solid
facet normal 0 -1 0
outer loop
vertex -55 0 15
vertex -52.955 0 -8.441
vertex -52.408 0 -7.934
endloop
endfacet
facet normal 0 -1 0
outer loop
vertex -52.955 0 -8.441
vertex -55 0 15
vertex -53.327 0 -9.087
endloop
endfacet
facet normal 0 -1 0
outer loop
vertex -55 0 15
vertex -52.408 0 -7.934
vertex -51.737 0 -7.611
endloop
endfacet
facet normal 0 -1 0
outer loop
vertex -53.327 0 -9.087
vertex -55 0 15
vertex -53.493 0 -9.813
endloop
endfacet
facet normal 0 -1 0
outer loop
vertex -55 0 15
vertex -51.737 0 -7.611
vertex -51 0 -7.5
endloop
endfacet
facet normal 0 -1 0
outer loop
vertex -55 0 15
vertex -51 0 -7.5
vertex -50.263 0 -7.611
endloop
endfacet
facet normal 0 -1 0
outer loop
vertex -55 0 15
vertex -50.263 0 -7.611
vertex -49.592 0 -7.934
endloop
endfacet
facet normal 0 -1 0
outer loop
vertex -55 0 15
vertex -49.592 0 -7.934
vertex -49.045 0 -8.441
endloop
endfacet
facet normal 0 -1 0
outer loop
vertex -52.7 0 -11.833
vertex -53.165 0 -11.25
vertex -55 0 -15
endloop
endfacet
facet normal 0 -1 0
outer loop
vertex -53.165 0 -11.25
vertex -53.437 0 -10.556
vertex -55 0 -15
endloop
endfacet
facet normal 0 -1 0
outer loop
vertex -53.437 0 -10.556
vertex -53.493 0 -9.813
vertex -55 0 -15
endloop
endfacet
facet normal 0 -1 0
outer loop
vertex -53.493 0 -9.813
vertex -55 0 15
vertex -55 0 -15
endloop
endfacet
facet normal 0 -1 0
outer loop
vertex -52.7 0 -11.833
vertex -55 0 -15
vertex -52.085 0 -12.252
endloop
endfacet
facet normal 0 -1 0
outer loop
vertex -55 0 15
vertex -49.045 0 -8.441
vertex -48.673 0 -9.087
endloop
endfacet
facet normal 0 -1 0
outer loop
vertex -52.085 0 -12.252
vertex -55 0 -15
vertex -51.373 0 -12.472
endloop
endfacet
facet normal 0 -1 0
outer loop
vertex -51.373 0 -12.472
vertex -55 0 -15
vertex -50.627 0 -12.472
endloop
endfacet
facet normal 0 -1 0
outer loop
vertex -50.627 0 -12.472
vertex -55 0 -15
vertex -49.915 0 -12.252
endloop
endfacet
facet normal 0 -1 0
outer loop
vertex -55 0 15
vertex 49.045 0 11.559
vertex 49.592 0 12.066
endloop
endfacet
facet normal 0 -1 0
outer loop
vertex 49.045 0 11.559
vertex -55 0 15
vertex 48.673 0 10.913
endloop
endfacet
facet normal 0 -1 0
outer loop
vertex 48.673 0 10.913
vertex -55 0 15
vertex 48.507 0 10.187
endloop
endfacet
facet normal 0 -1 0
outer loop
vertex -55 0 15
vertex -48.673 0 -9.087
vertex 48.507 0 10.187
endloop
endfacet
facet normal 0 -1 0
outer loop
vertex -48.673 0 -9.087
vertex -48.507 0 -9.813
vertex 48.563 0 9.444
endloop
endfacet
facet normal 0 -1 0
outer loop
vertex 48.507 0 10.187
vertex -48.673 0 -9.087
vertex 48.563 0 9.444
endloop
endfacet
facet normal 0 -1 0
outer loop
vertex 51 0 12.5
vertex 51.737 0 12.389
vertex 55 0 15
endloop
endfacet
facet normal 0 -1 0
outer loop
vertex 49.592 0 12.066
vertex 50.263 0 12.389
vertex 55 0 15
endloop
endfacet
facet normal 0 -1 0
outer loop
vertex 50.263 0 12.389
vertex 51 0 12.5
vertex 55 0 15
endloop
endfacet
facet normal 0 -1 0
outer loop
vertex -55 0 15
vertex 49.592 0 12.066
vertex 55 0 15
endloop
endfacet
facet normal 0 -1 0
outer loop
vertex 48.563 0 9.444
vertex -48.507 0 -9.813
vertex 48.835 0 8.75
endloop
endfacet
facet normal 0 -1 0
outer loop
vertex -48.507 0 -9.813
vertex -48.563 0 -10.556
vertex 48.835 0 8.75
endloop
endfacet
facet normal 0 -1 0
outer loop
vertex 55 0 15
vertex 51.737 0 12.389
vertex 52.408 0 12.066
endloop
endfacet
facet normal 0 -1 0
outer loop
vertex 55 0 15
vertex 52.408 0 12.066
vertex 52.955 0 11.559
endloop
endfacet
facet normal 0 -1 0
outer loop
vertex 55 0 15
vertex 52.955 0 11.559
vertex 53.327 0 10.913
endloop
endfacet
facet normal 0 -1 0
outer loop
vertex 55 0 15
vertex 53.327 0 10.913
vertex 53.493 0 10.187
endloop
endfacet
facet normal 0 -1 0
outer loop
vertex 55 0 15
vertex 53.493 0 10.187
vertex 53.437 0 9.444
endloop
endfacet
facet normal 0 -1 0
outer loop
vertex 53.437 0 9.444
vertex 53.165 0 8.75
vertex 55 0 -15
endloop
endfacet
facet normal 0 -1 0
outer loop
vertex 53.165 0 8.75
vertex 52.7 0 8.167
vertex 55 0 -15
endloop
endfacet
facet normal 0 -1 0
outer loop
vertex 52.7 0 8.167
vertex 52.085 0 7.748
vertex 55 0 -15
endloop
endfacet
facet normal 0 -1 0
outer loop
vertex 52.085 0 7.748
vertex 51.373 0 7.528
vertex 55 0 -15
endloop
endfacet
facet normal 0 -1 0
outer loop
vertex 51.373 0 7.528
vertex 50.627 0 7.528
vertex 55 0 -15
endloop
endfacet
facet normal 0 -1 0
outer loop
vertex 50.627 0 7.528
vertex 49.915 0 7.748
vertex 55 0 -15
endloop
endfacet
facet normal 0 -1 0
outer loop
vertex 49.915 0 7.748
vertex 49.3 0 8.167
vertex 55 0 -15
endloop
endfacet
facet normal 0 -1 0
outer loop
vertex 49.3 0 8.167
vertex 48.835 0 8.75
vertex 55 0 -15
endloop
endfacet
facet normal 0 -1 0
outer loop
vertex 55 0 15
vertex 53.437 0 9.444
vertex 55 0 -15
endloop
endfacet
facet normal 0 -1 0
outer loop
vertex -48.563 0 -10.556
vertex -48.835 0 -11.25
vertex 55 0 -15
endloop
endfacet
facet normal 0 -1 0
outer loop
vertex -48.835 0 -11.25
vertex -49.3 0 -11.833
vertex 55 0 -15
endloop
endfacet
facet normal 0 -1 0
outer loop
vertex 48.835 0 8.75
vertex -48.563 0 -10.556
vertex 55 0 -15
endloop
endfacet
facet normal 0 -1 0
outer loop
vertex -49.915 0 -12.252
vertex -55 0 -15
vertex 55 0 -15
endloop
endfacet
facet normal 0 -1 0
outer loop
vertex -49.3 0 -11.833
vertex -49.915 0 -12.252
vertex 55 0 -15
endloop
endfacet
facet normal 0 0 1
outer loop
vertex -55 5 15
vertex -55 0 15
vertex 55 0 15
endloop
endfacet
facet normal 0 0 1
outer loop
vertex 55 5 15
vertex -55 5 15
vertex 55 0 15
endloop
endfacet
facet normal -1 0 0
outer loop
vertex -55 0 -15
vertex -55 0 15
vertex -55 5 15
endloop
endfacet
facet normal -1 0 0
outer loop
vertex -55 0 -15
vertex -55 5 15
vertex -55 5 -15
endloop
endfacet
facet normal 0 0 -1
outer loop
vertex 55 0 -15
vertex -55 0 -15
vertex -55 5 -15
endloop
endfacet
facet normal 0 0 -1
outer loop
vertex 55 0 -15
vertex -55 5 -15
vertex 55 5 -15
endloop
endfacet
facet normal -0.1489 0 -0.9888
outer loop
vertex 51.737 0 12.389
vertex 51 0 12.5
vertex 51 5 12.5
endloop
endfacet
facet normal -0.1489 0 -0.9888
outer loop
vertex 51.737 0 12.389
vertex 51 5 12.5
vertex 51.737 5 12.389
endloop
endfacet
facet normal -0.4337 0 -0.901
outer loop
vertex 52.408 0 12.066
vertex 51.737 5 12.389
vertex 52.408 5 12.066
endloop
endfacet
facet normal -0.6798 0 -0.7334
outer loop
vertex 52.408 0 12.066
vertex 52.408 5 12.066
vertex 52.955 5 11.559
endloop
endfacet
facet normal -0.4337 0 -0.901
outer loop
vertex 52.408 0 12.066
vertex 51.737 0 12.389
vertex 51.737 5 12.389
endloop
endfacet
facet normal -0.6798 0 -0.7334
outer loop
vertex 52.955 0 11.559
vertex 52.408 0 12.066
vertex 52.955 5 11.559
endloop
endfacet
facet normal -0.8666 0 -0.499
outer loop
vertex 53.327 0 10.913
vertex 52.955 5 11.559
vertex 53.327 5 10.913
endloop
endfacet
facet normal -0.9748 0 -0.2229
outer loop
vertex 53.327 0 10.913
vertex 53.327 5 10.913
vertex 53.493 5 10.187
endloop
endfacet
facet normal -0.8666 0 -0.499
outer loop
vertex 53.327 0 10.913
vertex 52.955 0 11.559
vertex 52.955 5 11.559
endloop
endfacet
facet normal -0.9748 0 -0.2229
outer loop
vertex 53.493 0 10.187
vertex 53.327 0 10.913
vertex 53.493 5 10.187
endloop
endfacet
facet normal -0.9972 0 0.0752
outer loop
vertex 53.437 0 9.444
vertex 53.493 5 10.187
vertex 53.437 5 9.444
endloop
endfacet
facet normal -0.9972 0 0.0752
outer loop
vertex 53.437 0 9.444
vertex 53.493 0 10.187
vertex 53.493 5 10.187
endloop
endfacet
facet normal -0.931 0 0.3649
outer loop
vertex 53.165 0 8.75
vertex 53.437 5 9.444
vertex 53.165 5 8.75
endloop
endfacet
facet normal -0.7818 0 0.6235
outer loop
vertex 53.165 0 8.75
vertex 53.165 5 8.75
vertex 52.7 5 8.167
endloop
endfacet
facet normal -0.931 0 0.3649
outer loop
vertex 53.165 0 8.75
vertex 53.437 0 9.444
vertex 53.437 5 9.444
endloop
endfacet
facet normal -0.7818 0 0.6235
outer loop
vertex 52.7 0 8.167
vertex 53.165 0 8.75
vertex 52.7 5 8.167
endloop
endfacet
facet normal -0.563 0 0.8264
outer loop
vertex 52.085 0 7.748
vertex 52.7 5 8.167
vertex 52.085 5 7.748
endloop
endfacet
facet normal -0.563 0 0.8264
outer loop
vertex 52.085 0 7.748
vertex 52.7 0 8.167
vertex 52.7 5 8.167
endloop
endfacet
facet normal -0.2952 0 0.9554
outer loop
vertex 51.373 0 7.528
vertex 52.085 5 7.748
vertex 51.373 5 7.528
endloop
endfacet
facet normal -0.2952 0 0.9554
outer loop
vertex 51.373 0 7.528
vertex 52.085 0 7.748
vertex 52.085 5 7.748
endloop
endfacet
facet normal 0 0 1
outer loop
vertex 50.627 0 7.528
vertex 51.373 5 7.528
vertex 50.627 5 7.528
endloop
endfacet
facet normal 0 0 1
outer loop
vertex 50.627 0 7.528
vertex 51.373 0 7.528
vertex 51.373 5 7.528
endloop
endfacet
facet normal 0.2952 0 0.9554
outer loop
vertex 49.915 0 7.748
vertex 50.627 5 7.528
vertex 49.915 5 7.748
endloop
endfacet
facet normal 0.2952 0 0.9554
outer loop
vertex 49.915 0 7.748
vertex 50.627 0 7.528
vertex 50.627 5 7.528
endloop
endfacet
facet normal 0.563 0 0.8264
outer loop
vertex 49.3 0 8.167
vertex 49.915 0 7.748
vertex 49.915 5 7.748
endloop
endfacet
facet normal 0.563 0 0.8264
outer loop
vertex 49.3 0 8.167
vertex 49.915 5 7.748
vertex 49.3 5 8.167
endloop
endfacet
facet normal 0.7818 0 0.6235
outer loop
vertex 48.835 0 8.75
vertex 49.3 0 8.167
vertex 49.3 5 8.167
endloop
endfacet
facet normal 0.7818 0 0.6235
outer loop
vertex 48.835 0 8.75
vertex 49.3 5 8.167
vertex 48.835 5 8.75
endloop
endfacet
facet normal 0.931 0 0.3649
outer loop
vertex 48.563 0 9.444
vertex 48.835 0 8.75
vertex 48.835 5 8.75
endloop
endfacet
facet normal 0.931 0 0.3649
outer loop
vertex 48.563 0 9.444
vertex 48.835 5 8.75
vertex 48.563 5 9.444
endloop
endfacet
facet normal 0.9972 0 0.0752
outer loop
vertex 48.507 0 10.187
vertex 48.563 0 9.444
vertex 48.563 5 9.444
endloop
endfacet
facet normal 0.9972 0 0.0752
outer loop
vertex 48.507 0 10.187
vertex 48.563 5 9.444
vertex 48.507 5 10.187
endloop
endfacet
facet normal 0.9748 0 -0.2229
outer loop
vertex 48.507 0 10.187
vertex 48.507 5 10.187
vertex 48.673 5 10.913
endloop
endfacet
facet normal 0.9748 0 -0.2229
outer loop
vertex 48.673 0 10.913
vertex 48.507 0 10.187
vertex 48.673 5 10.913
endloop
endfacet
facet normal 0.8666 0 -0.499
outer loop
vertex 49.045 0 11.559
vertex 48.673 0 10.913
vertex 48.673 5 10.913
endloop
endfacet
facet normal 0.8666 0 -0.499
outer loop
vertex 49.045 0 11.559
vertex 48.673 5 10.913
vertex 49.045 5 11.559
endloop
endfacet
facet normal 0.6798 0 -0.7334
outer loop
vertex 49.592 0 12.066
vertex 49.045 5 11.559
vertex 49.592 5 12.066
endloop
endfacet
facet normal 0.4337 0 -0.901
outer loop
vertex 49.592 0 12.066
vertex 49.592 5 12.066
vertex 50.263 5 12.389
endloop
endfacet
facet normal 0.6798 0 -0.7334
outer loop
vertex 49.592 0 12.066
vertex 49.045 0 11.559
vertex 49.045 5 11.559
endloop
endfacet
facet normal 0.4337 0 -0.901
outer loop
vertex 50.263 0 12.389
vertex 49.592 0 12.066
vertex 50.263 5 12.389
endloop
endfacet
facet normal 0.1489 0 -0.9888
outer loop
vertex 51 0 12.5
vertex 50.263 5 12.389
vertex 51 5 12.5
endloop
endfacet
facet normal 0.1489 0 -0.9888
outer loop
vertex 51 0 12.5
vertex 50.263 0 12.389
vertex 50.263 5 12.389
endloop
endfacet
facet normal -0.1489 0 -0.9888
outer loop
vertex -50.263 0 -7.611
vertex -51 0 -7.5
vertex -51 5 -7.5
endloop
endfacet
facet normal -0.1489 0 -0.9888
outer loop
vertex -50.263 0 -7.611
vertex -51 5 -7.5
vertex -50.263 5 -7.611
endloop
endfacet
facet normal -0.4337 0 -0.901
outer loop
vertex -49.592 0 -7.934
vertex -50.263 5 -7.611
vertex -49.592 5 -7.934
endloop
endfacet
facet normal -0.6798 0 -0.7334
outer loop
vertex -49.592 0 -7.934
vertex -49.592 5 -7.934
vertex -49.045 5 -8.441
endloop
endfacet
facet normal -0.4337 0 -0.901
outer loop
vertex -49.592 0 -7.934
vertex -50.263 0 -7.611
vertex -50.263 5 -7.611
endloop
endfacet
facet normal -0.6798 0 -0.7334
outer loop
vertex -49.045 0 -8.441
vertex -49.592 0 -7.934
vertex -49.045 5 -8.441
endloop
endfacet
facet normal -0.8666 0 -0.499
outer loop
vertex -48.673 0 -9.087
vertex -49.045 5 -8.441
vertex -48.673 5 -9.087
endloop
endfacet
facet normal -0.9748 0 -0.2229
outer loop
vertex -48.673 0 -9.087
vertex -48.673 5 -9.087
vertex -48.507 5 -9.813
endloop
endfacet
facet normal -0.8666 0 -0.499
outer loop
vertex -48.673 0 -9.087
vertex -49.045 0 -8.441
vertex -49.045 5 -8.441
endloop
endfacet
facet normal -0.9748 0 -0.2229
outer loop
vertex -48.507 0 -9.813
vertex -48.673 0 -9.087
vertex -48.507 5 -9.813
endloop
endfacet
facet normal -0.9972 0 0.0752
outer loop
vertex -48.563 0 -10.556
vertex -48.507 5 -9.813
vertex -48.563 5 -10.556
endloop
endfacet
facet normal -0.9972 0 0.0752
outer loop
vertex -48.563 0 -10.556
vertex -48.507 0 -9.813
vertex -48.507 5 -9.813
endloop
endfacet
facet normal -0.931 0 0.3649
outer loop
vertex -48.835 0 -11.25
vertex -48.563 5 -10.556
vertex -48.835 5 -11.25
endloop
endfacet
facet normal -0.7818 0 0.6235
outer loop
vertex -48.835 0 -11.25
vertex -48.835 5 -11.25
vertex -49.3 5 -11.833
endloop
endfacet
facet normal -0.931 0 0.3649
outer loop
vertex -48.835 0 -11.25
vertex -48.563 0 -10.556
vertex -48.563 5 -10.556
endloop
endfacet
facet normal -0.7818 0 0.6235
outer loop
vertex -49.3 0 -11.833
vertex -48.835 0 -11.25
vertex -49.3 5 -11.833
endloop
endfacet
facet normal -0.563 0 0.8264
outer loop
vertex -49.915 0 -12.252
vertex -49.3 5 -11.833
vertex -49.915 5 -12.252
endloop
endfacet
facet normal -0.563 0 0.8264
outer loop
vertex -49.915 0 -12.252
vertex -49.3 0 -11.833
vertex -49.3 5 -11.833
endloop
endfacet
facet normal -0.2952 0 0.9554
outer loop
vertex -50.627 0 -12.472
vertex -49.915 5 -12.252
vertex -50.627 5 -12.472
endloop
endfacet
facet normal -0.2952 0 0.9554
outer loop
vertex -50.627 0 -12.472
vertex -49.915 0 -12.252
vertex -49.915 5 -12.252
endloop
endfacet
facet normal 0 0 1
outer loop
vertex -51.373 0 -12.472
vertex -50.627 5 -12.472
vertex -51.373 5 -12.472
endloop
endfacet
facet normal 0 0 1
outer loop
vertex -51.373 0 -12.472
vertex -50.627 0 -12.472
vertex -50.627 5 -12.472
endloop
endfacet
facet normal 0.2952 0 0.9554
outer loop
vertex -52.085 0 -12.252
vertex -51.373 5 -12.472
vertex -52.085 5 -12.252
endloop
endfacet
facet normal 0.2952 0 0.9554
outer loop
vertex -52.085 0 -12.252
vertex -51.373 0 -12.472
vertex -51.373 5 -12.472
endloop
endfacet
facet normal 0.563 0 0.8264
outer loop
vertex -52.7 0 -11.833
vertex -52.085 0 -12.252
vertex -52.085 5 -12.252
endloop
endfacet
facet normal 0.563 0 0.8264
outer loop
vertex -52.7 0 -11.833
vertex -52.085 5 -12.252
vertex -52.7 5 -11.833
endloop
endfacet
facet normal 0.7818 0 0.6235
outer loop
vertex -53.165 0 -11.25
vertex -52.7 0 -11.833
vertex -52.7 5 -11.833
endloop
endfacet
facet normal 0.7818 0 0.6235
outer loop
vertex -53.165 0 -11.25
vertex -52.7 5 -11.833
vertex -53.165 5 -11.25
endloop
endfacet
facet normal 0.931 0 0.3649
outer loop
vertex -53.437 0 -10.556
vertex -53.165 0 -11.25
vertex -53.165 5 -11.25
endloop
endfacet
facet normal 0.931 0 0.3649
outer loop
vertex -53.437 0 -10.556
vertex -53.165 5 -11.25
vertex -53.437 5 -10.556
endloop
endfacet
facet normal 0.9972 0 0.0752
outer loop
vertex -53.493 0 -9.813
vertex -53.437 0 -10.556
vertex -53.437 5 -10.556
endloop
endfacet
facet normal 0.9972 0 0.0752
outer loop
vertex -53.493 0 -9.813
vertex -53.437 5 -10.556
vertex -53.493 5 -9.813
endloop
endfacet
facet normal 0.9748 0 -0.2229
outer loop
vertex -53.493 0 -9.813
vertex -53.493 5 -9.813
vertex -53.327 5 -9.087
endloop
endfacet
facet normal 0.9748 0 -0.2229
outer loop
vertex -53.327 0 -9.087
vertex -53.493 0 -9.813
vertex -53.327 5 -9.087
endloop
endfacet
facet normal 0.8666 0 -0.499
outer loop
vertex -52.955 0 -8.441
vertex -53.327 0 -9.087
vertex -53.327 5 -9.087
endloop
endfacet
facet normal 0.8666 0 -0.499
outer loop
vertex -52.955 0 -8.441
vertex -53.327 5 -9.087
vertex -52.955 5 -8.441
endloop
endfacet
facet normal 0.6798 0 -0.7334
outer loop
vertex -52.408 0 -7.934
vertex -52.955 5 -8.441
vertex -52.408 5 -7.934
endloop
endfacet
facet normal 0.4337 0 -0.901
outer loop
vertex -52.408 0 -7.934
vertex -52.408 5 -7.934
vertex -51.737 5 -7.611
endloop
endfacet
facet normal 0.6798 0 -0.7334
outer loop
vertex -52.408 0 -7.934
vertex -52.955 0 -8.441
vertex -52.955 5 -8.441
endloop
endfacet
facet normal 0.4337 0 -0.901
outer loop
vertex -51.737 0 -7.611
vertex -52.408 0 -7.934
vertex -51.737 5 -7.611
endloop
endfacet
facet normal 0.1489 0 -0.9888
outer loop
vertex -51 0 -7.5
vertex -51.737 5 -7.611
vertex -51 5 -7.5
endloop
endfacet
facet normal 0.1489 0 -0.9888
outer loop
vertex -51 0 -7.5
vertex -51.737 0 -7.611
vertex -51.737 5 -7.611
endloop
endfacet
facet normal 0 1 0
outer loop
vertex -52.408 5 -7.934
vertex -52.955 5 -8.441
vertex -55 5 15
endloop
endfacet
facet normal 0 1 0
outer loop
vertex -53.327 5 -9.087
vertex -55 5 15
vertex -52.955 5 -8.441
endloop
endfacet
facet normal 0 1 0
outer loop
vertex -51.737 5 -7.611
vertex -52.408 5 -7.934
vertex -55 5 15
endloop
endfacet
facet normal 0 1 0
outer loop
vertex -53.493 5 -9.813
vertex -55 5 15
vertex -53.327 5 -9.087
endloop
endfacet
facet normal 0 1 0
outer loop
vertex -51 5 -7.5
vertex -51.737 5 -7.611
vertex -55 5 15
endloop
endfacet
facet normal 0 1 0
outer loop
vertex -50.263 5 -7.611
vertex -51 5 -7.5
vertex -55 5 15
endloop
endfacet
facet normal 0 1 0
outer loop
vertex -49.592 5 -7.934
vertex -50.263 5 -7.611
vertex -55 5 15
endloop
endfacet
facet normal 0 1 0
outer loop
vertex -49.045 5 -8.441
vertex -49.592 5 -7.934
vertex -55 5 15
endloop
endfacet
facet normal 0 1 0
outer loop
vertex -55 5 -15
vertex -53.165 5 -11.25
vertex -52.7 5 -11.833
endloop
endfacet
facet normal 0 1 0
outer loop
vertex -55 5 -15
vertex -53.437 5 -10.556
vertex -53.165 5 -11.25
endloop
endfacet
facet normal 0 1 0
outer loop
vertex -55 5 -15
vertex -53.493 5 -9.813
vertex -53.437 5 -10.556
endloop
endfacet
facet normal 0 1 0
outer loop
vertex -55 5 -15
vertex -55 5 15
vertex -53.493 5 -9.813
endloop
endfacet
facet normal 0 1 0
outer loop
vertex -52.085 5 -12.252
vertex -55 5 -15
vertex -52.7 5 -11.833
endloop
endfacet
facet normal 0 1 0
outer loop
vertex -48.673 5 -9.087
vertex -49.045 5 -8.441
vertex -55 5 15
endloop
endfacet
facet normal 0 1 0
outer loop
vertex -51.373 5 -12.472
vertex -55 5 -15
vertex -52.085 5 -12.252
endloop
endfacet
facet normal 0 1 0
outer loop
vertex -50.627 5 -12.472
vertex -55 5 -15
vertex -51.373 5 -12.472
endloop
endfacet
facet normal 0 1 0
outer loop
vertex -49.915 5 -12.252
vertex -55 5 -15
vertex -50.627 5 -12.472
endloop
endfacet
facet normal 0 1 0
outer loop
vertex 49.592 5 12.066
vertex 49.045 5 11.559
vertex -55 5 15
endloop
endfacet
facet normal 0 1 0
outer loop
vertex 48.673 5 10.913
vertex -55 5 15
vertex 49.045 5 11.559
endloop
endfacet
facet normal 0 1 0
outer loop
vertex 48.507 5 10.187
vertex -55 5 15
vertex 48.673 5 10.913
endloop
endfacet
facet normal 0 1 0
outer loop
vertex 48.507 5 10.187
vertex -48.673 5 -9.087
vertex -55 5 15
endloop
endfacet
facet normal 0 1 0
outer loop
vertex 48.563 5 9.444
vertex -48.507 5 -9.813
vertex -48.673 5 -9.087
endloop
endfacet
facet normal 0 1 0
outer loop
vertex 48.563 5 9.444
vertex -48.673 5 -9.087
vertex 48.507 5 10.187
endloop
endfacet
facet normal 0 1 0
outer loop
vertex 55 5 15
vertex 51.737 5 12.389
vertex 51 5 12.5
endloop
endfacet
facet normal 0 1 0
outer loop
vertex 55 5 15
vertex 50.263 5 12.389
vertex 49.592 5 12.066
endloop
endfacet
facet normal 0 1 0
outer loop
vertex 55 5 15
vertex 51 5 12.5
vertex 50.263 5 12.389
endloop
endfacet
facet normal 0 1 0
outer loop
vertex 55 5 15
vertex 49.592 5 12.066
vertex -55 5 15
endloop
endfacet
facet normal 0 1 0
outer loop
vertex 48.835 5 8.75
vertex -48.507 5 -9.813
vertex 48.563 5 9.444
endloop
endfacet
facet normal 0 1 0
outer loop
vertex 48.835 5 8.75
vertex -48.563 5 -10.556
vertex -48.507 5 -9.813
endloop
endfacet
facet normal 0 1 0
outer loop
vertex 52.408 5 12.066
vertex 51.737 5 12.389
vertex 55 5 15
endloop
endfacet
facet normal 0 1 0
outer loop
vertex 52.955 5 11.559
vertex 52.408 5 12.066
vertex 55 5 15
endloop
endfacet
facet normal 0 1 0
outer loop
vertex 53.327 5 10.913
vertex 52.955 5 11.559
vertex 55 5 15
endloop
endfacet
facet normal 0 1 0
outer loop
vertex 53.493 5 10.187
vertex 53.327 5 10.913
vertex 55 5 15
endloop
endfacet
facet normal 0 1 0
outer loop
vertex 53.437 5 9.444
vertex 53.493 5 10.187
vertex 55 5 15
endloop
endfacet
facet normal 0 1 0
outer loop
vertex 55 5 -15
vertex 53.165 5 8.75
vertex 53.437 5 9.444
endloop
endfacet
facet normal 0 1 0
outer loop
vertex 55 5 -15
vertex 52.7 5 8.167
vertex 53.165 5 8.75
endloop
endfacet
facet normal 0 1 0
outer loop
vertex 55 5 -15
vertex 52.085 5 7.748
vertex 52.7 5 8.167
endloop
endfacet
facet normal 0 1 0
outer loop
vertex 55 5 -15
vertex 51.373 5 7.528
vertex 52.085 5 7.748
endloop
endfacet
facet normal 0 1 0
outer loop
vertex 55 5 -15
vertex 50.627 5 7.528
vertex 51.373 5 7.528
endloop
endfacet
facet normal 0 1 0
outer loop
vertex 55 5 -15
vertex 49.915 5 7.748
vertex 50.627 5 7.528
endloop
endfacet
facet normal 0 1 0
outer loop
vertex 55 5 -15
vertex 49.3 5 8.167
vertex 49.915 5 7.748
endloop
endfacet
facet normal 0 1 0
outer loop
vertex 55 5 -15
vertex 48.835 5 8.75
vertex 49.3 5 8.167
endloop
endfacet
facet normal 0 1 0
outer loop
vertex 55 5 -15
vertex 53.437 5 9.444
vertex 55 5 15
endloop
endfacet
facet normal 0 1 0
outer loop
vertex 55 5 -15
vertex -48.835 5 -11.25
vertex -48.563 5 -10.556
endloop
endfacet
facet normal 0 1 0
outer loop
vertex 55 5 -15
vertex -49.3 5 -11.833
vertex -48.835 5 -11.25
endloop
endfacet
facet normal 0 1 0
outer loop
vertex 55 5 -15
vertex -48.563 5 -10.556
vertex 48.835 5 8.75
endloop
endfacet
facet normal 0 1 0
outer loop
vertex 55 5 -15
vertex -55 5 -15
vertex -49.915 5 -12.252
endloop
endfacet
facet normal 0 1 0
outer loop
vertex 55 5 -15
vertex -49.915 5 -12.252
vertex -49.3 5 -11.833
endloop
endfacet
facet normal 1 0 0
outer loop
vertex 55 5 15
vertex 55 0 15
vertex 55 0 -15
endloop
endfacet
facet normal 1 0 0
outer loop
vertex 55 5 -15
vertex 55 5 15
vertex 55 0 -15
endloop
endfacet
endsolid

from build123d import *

# Parameters (mm, degrees)
SKIZZE1_W                       = 110
SKIZZE1_H                       = 30
SKIZZE1_R                       = 2.5
AUFSATZ_LINEAR_AUSTRAGEN1_DEPTH = 5


with BuildPart() as part:
    # Skizze1 → Aufsatz-Linear austragen1 (new body)
    with BuildSketch(Plane(origin=(0, 0, 0), x_dir=(1, 0, 0), z_dir=(0, 1, 0))):
        Rectangle(SKIZZE1_W, SKIZZE1_H)
        with Locations(Location((-51, 10, 0), (0, 0, 270))):
            Circle(SKIZZE1_R, mode=Mode.SUBTRACT)
        with Locations(Location((51, -10, 0), (0, 0, 270))):
            Circle(SKIZZE1_R, mode=Mode.SUBTRACT)
    extrude(amount=AUFSATZ_LINEAR_AUSTRAGEN1_DEPTH)


solid = part.part
